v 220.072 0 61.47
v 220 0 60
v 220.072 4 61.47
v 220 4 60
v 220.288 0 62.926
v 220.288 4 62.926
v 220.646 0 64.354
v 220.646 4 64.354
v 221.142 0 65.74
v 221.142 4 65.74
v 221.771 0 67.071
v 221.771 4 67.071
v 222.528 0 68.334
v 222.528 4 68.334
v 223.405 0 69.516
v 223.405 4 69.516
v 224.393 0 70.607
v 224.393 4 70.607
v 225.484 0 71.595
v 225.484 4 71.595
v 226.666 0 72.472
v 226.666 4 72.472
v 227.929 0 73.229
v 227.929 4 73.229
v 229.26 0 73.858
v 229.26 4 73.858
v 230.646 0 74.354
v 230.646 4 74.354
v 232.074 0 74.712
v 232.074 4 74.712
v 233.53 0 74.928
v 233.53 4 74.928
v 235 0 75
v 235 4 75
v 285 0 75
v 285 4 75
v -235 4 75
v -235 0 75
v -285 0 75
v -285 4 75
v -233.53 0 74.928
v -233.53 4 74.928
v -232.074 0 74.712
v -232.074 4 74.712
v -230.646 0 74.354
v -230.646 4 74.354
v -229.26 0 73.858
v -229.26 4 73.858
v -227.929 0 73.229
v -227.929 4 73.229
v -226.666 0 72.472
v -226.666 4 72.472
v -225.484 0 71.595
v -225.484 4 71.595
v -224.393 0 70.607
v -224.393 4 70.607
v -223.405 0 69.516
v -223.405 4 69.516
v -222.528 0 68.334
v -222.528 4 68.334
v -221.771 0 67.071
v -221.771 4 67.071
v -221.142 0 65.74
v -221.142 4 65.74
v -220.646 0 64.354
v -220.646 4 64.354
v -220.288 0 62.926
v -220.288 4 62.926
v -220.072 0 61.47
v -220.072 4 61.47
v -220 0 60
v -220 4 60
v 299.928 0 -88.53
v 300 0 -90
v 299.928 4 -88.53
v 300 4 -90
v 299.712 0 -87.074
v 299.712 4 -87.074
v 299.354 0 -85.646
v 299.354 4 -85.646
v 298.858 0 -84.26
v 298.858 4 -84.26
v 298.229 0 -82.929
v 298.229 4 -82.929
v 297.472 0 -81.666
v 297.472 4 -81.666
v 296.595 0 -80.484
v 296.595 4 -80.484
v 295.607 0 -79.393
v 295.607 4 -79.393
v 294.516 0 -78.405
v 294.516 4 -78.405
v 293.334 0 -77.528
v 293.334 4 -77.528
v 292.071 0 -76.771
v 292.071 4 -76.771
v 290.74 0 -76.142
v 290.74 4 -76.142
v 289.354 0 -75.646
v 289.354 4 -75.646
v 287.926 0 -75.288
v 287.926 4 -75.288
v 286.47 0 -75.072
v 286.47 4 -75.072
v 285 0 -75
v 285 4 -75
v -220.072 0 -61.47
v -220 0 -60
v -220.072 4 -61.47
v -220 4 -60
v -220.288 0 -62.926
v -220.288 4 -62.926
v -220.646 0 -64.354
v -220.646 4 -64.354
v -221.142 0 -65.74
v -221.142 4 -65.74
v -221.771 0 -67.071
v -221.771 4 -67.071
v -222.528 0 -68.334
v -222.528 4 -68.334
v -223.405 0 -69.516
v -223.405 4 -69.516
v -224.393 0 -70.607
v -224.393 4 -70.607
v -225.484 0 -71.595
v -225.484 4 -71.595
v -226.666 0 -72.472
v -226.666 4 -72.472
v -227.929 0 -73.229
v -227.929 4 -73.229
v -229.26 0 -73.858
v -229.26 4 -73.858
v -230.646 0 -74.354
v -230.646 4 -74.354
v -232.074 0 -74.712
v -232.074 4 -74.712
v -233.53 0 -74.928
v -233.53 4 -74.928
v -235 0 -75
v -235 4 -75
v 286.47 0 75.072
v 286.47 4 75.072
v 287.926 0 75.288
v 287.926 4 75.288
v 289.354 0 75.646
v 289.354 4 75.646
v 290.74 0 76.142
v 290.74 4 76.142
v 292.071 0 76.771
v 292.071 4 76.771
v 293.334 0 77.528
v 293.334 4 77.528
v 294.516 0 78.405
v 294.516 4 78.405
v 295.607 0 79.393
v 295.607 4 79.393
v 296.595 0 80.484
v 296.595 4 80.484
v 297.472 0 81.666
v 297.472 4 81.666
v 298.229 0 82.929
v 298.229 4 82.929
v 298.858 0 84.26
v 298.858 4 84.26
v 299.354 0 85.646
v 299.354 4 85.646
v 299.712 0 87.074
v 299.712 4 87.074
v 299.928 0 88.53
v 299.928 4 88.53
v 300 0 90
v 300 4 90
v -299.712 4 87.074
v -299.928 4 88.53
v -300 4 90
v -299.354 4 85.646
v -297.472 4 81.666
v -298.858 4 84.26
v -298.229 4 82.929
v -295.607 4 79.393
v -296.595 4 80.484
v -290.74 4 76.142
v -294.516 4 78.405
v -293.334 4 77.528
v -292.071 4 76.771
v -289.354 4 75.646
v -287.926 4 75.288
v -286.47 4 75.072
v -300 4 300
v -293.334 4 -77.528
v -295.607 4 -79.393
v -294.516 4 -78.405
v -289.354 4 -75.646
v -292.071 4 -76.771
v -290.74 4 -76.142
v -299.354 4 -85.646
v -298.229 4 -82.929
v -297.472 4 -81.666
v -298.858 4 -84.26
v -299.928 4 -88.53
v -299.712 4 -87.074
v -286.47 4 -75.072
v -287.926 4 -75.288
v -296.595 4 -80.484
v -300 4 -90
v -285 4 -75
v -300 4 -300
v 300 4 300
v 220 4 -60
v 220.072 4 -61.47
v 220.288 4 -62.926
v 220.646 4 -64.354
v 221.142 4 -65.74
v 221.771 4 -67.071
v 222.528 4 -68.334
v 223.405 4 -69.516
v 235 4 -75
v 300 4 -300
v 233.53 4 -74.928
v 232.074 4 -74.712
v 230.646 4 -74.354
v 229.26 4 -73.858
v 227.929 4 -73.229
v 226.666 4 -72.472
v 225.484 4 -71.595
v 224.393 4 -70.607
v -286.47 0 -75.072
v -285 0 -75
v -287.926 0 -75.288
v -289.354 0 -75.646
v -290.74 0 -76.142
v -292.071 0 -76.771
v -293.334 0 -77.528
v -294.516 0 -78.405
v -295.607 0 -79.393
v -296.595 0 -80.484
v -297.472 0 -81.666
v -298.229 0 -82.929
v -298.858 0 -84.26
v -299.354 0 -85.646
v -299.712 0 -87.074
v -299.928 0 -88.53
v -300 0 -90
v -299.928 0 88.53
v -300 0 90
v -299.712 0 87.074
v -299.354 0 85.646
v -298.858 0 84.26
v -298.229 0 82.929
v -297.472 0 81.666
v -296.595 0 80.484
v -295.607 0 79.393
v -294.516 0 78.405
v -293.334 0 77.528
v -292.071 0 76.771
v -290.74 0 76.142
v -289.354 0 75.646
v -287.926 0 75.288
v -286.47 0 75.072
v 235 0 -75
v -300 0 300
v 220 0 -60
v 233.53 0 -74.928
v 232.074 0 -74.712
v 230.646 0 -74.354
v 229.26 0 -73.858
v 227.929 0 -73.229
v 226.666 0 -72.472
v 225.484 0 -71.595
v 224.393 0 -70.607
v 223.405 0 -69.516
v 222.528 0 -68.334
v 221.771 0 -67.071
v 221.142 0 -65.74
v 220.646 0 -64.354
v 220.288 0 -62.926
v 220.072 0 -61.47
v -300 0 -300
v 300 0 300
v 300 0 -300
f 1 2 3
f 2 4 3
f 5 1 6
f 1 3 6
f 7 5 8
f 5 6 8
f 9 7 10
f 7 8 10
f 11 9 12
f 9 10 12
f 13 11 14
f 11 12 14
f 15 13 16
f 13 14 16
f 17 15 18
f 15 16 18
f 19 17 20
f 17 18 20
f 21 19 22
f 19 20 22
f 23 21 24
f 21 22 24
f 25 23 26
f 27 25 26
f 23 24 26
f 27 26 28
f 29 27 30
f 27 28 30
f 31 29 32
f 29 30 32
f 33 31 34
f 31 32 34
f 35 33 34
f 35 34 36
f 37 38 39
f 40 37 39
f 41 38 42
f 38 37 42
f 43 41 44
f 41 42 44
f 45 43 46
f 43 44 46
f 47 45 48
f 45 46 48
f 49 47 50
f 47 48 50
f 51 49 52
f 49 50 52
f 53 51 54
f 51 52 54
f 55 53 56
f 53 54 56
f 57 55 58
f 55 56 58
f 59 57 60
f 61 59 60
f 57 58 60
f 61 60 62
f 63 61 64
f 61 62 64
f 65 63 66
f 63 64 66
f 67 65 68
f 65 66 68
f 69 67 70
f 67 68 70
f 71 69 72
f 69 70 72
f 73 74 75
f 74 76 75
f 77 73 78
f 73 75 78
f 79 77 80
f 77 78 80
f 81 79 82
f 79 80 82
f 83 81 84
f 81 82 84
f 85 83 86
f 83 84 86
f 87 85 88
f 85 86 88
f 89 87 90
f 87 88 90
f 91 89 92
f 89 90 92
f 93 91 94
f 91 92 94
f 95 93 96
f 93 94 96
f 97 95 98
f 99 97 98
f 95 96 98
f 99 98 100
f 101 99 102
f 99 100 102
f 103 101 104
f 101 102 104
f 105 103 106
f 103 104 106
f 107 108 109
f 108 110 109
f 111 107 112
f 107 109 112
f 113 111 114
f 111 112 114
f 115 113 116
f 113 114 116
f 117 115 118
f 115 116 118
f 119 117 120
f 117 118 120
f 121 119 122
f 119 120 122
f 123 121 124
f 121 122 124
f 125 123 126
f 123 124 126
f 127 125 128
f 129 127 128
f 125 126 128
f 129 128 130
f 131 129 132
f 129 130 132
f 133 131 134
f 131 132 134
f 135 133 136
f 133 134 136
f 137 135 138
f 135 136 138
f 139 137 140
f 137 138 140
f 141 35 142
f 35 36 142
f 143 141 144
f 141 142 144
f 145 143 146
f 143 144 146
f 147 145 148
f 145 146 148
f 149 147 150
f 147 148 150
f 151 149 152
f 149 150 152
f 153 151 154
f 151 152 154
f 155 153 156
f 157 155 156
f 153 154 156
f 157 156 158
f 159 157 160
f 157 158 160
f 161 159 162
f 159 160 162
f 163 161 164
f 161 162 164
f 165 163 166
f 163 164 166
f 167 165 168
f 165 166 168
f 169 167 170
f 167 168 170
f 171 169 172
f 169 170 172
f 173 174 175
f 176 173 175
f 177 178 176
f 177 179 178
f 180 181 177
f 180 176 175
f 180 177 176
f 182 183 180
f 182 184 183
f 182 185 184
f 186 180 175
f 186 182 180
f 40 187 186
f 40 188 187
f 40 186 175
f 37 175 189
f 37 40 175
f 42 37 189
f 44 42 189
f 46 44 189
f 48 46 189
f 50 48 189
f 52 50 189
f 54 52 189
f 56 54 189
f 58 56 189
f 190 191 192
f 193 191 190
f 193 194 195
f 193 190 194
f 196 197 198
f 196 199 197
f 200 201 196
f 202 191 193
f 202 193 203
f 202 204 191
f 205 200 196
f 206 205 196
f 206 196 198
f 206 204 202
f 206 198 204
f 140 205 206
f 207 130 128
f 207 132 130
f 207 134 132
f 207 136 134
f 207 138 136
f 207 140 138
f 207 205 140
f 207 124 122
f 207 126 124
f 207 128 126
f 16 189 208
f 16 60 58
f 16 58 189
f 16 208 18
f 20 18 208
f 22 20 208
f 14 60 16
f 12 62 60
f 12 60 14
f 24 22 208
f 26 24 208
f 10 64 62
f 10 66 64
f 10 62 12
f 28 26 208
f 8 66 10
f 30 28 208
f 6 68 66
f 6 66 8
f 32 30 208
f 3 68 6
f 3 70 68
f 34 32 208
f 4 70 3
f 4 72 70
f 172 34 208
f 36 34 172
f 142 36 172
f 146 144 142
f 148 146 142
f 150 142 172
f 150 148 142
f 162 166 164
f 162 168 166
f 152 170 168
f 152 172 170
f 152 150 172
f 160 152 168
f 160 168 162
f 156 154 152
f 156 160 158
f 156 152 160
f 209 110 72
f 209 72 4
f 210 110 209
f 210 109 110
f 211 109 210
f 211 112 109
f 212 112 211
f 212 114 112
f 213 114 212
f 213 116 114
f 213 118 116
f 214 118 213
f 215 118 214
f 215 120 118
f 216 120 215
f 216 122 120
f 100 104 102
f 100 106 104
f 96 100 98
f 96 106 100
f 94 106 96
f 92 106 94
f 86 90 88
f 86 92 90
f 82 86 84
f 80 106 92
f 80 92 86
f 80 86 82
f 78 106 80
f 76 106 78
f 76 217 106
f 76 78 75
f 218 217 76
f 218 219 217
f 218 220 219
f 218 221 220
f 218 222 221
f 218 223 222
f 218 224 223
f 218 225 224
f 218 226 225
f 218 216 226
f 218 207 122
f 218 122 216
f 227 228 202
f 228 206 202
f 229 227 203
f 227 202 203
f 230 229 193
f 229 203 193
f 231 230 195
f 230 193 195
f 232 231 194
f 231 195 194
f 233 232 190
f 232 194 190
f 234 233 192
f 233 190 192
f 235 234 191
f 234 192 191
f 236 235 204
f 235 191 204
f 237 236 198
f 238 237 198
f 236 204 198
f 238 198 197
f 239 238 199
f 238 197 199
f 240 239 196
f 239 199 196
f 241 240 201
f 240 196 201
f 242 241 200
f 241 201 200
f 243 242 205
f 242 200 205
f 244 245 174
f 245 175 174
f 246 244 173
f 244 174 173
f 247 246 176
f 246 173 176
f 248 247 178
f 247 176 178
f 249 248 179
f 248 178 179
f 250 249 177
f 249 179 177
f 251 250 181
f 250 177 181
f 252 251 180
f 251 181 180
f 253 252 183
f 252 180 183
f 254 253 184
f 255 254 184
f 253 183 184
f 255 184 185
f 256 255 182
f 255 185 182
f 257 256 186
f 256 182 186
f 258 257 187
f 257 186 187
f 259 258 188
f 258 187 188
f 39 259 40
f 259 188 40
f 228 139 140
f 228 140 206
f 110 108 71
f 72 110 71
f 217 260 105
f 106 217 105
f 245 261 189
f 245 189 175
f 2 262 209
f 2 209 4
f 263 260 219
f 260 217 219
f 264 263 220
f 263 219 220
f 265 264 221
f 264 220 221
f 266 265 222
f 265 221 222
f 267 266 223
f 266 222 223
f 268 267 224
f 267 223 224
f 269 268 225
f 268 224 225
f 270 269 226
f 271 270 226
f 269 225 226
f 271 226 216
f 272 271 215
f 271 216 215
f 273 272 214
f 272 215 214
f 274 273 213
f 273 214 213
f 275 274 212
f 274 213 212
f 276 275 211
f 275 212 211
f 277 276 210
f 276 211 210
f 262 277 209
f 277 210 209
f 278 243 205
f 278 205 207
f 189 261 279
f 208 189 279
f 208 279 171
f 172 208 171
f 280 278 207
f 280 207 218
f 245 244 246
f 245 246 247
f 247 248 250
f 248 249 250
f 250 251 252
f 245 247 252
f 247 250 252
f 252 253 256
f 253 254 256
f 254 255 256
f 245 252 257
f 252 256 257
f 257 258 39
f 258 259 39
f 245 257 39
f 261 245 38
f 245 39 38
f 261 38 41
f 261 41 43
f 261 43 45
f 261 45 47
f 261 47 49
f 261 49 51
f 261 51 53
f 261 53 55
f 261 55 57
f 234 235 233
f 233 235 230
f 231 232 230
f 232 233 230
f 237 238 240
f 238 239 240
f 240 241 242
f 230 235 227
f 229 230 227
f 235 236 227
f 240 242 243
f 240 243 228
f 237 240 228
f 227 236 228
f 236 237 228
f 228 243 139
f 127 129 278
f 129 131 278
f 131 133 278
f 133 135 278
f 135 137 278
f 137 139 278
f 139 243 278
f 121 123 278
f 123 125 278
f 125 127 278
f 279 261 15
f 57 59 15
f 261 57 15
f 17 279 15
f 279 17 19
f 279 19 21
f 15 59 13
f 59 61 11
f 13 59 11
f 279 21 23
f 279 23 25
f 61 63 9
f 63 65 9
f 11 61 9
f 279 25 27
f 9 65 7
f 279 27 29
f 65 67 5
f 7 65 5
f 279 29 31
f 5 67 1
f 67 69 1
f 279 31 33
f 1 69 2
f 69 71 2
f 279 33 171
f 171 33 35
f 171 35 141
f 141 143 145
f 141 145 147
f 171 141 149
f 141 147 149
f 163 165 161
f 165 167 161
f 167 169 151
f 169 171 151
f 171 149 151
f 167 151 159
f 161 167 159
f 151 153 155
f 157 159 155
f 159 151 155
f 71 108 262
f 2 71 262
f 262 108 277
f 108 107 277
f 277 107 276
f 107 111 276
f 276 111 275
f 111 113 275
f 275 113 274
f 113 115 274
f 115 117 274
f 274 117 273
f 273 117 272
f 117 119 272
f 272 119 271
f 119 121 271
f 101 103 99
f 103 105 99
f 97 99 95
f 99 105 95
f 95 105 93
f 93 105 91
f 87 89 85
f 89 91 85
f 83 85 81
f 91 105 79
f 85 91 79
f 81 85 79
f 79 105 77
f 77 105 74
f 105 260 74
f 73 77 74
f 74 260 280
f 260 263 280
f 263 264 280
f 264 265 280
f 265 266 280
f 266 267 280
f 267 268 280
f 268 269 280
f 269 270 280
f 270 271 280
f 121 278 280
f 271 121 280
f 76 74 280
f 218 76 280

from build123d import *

# Parameters (mm, degrees)
SKETCH_1_W          = 600
SKETCH_1_H          = 600
EXTRUDE_1_DEPTH     = 4
SKETCH_2_W          = 80
SKETCH_2_H          = 150
CUT_EXTRUDE_1_DEPTH = 4
FILLET_1_R          = 15


with BuildPart() as part:
    # 草图1 → 凸台-拉伸1 (new body)
    with BuildSketch(Plane(origin=(0, 0, 0), x_dir=(1, 0, 0), z_dir=(0, 1, 0))):
        Rectangle(SKETCH_1_W, SKETCH_1_H)
    extrude(amount=EXTRUDE_1_DEPTH)

    # 草图2 → 切除-拉伸1 (cut)
    with BuildSketch(Plane.XZ):
        with Locations((260, 0)):
            Rectangle(SKETCH_2_W, SKETCH_2_H)
    cut_extrude_1 = extrude(amount=-CUT_EXTRUDE_1_DEPTH, mode=Mode.SUBTRACT)

    # 镜向1: 切除-拉伸1 across plane
    add(cut_extrude_1.mirror(Plane(origin=(0, 0, 0), x_dir=(0, 0, 1), z_dir=(1, 0, 0))), mode=Mode.SUBTRACT)

    # 圆角1
    fillet_1_edges = [part.edges().sort_by_distance(p)[0] for p in [
        (300, 2, 75),
        (300, 2, -75),
        (220, 2, -75),
        (220, 2, 75),
        (-220, 2, -75),
        (-220, 2, 75),
        (-300, 2, 75),
        (-300, 2, -75),
    ]]
    fillet(fillet_1_edges, radius=FILLET_1_R)


solid = part.part
